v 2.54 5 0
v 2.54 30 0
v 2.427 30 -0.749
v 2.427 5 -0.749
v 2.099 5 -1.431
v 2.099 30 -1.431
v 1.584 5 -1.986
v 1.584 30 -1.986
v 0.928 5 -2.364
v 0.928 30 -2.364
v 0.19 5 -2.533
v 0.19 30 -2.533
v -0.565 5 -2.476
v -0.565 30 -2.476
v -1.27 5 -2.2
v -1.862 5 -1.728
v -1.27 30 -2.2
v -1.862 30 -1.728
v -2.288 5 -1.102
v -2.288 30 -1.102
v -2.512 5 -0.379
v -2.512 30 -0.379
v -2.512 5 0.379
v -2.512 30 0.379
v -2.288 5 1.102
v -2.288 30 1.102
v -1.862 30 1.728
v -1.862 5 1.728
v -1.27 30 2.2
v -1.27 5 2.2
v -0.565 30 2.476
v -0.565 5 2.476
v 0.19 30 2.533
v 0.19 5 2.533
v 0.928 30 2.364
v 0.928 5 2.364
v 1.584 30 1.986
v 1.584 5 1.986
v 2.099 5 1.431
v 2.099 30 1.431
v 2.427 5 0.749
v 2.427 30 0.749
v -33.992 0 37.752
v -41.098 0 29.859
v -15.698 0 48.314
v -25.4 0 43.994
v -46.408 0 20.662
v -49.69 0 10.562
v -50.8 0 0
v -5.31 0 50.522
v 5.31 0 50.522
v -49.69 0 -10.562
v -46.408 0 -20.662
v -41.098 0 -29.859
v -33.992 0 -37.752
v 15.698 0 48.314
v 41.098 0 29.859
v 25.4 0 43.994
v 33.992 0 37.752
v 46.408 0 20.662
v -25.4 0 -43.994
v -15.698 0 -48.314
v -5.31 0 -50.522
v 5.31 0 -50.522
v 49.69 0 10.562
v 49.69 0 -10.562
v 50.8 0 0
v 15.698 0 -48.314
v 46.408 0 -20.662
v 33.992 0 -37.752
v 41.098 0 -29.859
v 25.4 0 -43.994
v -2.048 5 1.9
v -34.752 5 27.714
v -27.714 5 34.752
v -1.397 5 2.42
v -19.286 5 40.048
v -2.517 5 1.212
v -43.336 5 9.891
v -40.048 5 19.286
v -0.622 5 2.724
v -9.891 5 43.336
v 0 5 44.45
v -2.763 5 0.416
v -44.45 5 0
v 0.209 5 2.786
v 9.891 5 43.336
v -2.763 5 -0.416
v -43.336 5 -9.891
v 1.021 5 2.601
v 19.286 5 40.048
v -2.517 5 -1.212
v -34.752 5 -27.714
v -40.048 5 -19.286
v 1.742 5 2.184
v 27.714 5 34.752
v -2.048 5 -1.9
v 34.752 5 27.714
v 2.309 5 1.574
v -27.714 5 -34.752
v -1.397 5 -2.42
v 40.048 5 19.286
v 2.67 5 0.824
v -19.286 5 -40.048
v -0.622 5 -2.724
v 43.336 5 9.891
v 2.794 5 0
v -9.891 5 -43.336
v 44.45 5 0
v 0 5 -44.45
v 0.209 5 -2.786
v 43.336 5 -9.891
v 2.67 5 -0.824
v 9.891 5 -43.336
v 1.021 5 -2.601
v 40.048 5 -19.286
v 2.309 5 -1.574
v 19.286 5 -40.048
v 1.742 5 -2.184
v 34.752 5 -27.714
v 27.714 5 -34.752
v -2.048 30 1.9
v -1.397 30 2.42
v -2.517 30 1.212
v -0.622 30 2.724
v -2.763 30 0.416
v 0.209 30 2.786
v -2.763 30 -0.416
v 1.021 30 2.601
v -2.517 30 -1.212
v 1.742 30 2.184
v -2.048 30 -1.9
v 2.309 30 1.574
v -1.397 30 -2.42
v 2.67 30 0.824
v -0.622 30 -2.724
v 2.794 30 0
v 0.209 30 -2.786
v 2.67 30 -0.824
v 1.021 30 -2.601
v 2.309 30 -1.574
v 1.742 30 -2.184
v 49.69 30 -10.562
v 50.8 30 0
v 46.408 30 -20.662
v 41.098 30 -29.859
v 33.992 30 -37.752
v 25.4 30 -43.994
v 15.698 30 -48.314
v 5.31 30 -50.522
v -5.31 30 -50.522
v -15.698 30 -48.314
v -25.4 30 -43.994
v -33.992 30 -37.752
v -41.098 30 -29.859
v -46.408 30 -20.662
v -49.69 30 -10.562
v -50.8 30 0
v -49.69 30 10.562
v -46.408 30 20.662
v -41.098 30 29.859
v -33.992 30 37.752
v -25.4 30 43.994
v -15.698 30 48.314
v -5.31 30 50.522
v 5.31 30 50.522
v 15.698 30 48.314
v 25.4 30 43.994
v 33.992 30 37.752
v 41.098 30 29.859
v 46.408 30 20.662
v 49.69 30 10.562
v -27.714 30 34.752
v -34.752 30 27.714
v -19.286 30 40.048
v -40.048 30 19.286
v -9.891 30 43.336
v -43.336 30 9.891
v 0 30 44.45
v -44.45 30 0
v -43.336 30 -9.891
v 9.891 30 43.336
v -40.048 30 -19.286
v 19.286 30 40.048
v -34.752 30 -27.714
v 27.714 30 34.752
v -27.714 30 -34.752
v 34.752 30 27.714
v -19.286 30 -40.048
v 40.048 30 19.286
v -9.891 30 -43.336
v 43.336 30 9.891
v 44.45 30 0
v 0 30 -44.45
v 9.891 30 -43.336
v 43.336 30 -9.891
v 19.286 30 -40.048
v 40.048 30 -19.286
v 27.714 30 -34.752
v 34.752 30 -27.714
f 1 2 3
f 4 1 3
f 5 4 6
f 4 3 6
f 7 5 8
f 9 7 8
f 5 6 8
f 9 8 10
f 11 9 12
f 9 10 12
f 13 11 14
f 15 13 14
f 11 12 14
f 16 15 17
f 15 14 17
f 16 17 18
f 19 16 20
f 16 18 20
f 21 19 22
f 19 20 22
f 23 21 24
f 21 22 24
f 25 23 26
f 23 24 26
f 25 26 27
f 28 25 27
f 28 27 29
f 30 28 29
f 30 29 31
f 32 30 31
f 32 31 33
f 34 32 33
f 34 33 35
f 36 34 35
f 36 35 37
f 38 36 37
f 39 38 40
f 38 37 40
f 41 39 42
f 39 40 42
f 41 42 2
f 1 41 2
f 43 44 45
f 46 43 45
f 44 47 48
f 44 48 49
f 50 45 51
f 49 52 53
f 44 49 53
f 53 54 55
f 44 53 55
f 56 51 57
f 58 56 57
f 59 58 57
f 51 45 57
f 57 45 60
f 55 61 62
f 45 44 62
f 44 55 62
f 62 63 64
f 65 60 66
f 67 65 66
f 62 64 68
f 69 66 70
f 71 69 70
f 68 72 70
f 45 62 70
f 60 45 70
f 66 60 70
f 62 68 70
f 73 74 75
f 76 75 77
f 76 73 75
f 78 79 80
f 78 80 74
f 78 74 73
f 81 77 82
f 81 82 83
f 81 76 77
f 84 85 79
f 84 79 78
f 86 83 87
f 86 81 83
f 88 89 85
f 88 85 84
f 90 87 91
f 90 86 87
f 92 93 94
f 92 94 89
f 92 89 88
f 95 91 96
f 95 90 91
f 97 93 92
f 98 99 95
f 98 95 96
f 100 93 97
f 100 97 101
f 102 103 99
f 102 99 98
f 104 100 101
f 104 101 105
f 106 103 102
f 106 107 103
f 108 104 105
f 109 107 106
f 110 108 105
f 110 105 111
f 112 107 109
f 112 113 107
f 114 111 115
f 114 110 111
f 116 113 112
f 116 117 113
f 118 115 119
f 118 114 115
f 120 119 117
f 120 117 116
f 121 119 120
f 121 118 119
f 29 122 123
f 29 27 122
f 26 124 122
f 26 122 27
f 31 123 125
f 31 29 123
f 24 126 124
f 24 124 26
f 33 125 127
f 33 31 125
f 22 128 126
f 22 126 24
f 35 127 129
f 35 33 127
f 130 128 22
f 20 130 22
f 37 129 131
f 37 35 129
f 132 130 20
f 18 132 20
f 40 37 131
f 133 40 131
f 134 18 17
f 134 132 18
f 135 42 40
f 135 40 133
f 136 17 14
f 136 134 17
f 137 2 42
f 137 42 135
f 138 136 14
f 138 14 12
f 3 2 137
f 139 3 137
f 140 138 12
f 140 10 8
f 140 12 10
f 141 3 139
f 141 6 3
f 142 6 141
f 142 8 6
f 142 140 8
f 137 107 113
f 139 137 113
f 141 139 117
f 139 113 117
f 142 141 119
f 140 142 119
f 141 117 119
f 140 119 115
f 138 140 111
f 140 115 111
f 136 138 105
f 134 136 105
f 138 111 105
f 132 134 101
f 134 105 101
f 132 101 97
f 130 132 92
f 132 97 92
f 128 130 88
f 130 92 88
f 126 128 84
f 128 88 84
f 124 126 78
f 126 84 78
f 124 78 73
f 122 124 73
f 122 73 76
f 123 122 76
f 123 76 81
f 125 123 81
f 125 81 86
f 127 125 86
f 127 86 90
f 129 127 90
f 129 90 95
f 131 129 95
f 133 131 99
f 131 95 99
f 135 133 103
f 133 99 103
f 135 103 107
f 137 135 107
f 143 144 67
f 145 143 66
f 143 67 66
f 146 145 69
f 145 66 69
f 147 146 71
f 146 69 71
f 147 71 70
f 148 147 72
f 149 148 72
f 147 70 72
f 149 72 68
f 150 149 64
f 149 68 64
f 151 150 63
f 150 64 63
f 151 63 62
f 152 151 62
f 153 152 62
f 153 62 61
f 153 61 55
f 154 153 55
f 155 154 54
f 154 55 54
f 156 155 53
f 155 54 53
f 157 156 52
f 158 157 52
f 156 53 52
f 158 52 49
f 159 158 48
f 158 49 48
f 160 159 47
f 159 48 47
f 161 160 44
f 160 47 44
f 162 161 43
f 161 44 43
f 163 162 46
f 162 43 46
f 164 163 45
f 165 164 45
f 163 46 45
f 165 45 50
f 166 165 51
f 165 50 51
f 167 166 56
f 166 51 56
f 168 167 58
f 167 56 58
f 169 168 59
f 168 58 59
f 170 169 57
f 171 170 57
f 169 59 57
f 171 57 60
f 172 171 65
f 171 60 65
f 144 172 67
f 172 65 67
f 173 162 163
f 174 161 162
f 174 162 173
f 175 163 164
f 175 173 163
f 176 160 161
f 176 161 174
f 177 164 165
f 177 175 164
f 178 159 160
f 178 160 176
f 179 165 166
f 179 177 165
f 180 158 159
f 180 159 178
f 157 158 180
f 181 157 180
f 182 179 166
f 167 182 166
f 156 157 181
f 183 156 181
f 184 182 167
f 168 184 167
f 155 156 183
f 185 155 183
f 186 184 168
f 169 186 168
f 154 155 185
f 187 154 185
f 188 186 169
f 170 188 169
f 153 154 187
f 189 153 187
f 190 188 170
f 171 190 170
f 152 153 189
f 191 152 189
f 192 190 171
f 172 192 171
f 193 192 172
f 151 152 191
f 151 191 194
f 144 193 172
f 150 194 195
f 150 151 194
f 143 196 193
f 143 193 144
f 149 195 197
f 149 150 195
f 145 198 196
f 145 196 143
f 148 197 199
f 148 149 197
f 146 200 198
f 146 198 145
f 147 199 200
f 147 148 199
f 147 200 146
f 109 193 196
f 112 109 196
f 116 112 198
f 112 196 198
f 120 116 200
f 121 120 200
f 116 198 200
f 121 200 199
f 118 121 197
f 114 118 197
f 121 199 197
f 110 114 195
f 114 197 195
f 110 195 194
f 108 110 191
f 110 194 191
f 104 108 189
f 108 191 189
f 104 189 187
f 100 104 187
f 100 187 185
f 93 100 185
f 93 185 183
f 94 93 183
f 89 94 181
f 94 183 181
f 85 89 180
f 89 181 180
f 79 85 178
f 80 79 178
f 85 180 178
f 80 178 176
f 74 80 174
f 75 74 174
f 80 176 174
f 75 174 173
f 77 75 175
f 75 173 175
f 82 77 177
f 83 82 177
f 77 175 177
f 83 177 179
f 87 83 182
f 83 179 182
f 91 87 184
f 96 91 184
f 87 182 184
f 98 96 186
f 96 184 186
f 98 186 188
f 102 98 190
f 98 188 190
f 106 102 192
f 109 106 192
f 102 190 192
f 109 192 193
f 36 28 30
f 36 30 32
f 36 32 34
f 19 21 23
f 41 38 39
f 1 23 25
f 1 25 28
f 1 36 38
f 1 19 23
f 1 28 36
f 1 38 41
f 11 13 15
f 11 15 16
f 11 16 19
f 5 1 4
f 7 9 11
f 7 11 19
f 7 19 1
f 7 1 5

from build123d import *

# Parameters (mm, degrees)
SKETCH1_R           = 50.8
BOSS_EXTRUDE2_DEPTH = 30
SKETCH3_R           = 44.45
CUT_EXTRUDE1_DEPTH  = 25
SKETCH4_R           = 2.794
BOSS_EXTRUDE3_DEPTH = 25
SKETCH5_R           = 2.54
CUT_EXTRUDE2_DEPTH  = 25


with BuildPart() as part:
    # Sketch1 → Boss-Extrude2 (new body)
    with BuildSketch(Plane(origin=(0, 0, 0), x_dir=(1, 0, 0), z_dir=(0, 1, 0))):
        Circle(SKETCH1_R)
    extrude(amount=BOSS_EXTRUDE2_DEPTH)

    # Sketch3 → Cut-Extrude1 (cut)
    with BuildSketch(Plane(origin=(0, 30, 0), x_dir=(1, 0, 0), z_dir=(0, 1, 0))):
        Circle(SKETCH3_R)
    extrude(amount=-CUT_EXTRUDE1_DEPTH, mode=Mode.SUBTRACT)

    # Sketch4 → Boss-Extrude3 (add)
    with BuildSketch(Plane(origin=(0, 5, 0), x_dir=(1, 0, 0), z_dir=(0, 1, 0))):
        Circle(SKETCH4_R)
    extrude(amount=BOSS_EXTRUDE3_DEPTH)

    # Sketch5 → Cut-Extrude2 (cut)
    with BuildSketch(Plane(origin=(0, 30, 0), x_dir=(1, 0, 0), z_dir=(0, 1, 0))):
        Circle(SKETCH5_R)
    extrude(amount=-CUT_EXTRUDE2_DEPTH, mode=Mode.SUBTRACT)


solid = part.part
